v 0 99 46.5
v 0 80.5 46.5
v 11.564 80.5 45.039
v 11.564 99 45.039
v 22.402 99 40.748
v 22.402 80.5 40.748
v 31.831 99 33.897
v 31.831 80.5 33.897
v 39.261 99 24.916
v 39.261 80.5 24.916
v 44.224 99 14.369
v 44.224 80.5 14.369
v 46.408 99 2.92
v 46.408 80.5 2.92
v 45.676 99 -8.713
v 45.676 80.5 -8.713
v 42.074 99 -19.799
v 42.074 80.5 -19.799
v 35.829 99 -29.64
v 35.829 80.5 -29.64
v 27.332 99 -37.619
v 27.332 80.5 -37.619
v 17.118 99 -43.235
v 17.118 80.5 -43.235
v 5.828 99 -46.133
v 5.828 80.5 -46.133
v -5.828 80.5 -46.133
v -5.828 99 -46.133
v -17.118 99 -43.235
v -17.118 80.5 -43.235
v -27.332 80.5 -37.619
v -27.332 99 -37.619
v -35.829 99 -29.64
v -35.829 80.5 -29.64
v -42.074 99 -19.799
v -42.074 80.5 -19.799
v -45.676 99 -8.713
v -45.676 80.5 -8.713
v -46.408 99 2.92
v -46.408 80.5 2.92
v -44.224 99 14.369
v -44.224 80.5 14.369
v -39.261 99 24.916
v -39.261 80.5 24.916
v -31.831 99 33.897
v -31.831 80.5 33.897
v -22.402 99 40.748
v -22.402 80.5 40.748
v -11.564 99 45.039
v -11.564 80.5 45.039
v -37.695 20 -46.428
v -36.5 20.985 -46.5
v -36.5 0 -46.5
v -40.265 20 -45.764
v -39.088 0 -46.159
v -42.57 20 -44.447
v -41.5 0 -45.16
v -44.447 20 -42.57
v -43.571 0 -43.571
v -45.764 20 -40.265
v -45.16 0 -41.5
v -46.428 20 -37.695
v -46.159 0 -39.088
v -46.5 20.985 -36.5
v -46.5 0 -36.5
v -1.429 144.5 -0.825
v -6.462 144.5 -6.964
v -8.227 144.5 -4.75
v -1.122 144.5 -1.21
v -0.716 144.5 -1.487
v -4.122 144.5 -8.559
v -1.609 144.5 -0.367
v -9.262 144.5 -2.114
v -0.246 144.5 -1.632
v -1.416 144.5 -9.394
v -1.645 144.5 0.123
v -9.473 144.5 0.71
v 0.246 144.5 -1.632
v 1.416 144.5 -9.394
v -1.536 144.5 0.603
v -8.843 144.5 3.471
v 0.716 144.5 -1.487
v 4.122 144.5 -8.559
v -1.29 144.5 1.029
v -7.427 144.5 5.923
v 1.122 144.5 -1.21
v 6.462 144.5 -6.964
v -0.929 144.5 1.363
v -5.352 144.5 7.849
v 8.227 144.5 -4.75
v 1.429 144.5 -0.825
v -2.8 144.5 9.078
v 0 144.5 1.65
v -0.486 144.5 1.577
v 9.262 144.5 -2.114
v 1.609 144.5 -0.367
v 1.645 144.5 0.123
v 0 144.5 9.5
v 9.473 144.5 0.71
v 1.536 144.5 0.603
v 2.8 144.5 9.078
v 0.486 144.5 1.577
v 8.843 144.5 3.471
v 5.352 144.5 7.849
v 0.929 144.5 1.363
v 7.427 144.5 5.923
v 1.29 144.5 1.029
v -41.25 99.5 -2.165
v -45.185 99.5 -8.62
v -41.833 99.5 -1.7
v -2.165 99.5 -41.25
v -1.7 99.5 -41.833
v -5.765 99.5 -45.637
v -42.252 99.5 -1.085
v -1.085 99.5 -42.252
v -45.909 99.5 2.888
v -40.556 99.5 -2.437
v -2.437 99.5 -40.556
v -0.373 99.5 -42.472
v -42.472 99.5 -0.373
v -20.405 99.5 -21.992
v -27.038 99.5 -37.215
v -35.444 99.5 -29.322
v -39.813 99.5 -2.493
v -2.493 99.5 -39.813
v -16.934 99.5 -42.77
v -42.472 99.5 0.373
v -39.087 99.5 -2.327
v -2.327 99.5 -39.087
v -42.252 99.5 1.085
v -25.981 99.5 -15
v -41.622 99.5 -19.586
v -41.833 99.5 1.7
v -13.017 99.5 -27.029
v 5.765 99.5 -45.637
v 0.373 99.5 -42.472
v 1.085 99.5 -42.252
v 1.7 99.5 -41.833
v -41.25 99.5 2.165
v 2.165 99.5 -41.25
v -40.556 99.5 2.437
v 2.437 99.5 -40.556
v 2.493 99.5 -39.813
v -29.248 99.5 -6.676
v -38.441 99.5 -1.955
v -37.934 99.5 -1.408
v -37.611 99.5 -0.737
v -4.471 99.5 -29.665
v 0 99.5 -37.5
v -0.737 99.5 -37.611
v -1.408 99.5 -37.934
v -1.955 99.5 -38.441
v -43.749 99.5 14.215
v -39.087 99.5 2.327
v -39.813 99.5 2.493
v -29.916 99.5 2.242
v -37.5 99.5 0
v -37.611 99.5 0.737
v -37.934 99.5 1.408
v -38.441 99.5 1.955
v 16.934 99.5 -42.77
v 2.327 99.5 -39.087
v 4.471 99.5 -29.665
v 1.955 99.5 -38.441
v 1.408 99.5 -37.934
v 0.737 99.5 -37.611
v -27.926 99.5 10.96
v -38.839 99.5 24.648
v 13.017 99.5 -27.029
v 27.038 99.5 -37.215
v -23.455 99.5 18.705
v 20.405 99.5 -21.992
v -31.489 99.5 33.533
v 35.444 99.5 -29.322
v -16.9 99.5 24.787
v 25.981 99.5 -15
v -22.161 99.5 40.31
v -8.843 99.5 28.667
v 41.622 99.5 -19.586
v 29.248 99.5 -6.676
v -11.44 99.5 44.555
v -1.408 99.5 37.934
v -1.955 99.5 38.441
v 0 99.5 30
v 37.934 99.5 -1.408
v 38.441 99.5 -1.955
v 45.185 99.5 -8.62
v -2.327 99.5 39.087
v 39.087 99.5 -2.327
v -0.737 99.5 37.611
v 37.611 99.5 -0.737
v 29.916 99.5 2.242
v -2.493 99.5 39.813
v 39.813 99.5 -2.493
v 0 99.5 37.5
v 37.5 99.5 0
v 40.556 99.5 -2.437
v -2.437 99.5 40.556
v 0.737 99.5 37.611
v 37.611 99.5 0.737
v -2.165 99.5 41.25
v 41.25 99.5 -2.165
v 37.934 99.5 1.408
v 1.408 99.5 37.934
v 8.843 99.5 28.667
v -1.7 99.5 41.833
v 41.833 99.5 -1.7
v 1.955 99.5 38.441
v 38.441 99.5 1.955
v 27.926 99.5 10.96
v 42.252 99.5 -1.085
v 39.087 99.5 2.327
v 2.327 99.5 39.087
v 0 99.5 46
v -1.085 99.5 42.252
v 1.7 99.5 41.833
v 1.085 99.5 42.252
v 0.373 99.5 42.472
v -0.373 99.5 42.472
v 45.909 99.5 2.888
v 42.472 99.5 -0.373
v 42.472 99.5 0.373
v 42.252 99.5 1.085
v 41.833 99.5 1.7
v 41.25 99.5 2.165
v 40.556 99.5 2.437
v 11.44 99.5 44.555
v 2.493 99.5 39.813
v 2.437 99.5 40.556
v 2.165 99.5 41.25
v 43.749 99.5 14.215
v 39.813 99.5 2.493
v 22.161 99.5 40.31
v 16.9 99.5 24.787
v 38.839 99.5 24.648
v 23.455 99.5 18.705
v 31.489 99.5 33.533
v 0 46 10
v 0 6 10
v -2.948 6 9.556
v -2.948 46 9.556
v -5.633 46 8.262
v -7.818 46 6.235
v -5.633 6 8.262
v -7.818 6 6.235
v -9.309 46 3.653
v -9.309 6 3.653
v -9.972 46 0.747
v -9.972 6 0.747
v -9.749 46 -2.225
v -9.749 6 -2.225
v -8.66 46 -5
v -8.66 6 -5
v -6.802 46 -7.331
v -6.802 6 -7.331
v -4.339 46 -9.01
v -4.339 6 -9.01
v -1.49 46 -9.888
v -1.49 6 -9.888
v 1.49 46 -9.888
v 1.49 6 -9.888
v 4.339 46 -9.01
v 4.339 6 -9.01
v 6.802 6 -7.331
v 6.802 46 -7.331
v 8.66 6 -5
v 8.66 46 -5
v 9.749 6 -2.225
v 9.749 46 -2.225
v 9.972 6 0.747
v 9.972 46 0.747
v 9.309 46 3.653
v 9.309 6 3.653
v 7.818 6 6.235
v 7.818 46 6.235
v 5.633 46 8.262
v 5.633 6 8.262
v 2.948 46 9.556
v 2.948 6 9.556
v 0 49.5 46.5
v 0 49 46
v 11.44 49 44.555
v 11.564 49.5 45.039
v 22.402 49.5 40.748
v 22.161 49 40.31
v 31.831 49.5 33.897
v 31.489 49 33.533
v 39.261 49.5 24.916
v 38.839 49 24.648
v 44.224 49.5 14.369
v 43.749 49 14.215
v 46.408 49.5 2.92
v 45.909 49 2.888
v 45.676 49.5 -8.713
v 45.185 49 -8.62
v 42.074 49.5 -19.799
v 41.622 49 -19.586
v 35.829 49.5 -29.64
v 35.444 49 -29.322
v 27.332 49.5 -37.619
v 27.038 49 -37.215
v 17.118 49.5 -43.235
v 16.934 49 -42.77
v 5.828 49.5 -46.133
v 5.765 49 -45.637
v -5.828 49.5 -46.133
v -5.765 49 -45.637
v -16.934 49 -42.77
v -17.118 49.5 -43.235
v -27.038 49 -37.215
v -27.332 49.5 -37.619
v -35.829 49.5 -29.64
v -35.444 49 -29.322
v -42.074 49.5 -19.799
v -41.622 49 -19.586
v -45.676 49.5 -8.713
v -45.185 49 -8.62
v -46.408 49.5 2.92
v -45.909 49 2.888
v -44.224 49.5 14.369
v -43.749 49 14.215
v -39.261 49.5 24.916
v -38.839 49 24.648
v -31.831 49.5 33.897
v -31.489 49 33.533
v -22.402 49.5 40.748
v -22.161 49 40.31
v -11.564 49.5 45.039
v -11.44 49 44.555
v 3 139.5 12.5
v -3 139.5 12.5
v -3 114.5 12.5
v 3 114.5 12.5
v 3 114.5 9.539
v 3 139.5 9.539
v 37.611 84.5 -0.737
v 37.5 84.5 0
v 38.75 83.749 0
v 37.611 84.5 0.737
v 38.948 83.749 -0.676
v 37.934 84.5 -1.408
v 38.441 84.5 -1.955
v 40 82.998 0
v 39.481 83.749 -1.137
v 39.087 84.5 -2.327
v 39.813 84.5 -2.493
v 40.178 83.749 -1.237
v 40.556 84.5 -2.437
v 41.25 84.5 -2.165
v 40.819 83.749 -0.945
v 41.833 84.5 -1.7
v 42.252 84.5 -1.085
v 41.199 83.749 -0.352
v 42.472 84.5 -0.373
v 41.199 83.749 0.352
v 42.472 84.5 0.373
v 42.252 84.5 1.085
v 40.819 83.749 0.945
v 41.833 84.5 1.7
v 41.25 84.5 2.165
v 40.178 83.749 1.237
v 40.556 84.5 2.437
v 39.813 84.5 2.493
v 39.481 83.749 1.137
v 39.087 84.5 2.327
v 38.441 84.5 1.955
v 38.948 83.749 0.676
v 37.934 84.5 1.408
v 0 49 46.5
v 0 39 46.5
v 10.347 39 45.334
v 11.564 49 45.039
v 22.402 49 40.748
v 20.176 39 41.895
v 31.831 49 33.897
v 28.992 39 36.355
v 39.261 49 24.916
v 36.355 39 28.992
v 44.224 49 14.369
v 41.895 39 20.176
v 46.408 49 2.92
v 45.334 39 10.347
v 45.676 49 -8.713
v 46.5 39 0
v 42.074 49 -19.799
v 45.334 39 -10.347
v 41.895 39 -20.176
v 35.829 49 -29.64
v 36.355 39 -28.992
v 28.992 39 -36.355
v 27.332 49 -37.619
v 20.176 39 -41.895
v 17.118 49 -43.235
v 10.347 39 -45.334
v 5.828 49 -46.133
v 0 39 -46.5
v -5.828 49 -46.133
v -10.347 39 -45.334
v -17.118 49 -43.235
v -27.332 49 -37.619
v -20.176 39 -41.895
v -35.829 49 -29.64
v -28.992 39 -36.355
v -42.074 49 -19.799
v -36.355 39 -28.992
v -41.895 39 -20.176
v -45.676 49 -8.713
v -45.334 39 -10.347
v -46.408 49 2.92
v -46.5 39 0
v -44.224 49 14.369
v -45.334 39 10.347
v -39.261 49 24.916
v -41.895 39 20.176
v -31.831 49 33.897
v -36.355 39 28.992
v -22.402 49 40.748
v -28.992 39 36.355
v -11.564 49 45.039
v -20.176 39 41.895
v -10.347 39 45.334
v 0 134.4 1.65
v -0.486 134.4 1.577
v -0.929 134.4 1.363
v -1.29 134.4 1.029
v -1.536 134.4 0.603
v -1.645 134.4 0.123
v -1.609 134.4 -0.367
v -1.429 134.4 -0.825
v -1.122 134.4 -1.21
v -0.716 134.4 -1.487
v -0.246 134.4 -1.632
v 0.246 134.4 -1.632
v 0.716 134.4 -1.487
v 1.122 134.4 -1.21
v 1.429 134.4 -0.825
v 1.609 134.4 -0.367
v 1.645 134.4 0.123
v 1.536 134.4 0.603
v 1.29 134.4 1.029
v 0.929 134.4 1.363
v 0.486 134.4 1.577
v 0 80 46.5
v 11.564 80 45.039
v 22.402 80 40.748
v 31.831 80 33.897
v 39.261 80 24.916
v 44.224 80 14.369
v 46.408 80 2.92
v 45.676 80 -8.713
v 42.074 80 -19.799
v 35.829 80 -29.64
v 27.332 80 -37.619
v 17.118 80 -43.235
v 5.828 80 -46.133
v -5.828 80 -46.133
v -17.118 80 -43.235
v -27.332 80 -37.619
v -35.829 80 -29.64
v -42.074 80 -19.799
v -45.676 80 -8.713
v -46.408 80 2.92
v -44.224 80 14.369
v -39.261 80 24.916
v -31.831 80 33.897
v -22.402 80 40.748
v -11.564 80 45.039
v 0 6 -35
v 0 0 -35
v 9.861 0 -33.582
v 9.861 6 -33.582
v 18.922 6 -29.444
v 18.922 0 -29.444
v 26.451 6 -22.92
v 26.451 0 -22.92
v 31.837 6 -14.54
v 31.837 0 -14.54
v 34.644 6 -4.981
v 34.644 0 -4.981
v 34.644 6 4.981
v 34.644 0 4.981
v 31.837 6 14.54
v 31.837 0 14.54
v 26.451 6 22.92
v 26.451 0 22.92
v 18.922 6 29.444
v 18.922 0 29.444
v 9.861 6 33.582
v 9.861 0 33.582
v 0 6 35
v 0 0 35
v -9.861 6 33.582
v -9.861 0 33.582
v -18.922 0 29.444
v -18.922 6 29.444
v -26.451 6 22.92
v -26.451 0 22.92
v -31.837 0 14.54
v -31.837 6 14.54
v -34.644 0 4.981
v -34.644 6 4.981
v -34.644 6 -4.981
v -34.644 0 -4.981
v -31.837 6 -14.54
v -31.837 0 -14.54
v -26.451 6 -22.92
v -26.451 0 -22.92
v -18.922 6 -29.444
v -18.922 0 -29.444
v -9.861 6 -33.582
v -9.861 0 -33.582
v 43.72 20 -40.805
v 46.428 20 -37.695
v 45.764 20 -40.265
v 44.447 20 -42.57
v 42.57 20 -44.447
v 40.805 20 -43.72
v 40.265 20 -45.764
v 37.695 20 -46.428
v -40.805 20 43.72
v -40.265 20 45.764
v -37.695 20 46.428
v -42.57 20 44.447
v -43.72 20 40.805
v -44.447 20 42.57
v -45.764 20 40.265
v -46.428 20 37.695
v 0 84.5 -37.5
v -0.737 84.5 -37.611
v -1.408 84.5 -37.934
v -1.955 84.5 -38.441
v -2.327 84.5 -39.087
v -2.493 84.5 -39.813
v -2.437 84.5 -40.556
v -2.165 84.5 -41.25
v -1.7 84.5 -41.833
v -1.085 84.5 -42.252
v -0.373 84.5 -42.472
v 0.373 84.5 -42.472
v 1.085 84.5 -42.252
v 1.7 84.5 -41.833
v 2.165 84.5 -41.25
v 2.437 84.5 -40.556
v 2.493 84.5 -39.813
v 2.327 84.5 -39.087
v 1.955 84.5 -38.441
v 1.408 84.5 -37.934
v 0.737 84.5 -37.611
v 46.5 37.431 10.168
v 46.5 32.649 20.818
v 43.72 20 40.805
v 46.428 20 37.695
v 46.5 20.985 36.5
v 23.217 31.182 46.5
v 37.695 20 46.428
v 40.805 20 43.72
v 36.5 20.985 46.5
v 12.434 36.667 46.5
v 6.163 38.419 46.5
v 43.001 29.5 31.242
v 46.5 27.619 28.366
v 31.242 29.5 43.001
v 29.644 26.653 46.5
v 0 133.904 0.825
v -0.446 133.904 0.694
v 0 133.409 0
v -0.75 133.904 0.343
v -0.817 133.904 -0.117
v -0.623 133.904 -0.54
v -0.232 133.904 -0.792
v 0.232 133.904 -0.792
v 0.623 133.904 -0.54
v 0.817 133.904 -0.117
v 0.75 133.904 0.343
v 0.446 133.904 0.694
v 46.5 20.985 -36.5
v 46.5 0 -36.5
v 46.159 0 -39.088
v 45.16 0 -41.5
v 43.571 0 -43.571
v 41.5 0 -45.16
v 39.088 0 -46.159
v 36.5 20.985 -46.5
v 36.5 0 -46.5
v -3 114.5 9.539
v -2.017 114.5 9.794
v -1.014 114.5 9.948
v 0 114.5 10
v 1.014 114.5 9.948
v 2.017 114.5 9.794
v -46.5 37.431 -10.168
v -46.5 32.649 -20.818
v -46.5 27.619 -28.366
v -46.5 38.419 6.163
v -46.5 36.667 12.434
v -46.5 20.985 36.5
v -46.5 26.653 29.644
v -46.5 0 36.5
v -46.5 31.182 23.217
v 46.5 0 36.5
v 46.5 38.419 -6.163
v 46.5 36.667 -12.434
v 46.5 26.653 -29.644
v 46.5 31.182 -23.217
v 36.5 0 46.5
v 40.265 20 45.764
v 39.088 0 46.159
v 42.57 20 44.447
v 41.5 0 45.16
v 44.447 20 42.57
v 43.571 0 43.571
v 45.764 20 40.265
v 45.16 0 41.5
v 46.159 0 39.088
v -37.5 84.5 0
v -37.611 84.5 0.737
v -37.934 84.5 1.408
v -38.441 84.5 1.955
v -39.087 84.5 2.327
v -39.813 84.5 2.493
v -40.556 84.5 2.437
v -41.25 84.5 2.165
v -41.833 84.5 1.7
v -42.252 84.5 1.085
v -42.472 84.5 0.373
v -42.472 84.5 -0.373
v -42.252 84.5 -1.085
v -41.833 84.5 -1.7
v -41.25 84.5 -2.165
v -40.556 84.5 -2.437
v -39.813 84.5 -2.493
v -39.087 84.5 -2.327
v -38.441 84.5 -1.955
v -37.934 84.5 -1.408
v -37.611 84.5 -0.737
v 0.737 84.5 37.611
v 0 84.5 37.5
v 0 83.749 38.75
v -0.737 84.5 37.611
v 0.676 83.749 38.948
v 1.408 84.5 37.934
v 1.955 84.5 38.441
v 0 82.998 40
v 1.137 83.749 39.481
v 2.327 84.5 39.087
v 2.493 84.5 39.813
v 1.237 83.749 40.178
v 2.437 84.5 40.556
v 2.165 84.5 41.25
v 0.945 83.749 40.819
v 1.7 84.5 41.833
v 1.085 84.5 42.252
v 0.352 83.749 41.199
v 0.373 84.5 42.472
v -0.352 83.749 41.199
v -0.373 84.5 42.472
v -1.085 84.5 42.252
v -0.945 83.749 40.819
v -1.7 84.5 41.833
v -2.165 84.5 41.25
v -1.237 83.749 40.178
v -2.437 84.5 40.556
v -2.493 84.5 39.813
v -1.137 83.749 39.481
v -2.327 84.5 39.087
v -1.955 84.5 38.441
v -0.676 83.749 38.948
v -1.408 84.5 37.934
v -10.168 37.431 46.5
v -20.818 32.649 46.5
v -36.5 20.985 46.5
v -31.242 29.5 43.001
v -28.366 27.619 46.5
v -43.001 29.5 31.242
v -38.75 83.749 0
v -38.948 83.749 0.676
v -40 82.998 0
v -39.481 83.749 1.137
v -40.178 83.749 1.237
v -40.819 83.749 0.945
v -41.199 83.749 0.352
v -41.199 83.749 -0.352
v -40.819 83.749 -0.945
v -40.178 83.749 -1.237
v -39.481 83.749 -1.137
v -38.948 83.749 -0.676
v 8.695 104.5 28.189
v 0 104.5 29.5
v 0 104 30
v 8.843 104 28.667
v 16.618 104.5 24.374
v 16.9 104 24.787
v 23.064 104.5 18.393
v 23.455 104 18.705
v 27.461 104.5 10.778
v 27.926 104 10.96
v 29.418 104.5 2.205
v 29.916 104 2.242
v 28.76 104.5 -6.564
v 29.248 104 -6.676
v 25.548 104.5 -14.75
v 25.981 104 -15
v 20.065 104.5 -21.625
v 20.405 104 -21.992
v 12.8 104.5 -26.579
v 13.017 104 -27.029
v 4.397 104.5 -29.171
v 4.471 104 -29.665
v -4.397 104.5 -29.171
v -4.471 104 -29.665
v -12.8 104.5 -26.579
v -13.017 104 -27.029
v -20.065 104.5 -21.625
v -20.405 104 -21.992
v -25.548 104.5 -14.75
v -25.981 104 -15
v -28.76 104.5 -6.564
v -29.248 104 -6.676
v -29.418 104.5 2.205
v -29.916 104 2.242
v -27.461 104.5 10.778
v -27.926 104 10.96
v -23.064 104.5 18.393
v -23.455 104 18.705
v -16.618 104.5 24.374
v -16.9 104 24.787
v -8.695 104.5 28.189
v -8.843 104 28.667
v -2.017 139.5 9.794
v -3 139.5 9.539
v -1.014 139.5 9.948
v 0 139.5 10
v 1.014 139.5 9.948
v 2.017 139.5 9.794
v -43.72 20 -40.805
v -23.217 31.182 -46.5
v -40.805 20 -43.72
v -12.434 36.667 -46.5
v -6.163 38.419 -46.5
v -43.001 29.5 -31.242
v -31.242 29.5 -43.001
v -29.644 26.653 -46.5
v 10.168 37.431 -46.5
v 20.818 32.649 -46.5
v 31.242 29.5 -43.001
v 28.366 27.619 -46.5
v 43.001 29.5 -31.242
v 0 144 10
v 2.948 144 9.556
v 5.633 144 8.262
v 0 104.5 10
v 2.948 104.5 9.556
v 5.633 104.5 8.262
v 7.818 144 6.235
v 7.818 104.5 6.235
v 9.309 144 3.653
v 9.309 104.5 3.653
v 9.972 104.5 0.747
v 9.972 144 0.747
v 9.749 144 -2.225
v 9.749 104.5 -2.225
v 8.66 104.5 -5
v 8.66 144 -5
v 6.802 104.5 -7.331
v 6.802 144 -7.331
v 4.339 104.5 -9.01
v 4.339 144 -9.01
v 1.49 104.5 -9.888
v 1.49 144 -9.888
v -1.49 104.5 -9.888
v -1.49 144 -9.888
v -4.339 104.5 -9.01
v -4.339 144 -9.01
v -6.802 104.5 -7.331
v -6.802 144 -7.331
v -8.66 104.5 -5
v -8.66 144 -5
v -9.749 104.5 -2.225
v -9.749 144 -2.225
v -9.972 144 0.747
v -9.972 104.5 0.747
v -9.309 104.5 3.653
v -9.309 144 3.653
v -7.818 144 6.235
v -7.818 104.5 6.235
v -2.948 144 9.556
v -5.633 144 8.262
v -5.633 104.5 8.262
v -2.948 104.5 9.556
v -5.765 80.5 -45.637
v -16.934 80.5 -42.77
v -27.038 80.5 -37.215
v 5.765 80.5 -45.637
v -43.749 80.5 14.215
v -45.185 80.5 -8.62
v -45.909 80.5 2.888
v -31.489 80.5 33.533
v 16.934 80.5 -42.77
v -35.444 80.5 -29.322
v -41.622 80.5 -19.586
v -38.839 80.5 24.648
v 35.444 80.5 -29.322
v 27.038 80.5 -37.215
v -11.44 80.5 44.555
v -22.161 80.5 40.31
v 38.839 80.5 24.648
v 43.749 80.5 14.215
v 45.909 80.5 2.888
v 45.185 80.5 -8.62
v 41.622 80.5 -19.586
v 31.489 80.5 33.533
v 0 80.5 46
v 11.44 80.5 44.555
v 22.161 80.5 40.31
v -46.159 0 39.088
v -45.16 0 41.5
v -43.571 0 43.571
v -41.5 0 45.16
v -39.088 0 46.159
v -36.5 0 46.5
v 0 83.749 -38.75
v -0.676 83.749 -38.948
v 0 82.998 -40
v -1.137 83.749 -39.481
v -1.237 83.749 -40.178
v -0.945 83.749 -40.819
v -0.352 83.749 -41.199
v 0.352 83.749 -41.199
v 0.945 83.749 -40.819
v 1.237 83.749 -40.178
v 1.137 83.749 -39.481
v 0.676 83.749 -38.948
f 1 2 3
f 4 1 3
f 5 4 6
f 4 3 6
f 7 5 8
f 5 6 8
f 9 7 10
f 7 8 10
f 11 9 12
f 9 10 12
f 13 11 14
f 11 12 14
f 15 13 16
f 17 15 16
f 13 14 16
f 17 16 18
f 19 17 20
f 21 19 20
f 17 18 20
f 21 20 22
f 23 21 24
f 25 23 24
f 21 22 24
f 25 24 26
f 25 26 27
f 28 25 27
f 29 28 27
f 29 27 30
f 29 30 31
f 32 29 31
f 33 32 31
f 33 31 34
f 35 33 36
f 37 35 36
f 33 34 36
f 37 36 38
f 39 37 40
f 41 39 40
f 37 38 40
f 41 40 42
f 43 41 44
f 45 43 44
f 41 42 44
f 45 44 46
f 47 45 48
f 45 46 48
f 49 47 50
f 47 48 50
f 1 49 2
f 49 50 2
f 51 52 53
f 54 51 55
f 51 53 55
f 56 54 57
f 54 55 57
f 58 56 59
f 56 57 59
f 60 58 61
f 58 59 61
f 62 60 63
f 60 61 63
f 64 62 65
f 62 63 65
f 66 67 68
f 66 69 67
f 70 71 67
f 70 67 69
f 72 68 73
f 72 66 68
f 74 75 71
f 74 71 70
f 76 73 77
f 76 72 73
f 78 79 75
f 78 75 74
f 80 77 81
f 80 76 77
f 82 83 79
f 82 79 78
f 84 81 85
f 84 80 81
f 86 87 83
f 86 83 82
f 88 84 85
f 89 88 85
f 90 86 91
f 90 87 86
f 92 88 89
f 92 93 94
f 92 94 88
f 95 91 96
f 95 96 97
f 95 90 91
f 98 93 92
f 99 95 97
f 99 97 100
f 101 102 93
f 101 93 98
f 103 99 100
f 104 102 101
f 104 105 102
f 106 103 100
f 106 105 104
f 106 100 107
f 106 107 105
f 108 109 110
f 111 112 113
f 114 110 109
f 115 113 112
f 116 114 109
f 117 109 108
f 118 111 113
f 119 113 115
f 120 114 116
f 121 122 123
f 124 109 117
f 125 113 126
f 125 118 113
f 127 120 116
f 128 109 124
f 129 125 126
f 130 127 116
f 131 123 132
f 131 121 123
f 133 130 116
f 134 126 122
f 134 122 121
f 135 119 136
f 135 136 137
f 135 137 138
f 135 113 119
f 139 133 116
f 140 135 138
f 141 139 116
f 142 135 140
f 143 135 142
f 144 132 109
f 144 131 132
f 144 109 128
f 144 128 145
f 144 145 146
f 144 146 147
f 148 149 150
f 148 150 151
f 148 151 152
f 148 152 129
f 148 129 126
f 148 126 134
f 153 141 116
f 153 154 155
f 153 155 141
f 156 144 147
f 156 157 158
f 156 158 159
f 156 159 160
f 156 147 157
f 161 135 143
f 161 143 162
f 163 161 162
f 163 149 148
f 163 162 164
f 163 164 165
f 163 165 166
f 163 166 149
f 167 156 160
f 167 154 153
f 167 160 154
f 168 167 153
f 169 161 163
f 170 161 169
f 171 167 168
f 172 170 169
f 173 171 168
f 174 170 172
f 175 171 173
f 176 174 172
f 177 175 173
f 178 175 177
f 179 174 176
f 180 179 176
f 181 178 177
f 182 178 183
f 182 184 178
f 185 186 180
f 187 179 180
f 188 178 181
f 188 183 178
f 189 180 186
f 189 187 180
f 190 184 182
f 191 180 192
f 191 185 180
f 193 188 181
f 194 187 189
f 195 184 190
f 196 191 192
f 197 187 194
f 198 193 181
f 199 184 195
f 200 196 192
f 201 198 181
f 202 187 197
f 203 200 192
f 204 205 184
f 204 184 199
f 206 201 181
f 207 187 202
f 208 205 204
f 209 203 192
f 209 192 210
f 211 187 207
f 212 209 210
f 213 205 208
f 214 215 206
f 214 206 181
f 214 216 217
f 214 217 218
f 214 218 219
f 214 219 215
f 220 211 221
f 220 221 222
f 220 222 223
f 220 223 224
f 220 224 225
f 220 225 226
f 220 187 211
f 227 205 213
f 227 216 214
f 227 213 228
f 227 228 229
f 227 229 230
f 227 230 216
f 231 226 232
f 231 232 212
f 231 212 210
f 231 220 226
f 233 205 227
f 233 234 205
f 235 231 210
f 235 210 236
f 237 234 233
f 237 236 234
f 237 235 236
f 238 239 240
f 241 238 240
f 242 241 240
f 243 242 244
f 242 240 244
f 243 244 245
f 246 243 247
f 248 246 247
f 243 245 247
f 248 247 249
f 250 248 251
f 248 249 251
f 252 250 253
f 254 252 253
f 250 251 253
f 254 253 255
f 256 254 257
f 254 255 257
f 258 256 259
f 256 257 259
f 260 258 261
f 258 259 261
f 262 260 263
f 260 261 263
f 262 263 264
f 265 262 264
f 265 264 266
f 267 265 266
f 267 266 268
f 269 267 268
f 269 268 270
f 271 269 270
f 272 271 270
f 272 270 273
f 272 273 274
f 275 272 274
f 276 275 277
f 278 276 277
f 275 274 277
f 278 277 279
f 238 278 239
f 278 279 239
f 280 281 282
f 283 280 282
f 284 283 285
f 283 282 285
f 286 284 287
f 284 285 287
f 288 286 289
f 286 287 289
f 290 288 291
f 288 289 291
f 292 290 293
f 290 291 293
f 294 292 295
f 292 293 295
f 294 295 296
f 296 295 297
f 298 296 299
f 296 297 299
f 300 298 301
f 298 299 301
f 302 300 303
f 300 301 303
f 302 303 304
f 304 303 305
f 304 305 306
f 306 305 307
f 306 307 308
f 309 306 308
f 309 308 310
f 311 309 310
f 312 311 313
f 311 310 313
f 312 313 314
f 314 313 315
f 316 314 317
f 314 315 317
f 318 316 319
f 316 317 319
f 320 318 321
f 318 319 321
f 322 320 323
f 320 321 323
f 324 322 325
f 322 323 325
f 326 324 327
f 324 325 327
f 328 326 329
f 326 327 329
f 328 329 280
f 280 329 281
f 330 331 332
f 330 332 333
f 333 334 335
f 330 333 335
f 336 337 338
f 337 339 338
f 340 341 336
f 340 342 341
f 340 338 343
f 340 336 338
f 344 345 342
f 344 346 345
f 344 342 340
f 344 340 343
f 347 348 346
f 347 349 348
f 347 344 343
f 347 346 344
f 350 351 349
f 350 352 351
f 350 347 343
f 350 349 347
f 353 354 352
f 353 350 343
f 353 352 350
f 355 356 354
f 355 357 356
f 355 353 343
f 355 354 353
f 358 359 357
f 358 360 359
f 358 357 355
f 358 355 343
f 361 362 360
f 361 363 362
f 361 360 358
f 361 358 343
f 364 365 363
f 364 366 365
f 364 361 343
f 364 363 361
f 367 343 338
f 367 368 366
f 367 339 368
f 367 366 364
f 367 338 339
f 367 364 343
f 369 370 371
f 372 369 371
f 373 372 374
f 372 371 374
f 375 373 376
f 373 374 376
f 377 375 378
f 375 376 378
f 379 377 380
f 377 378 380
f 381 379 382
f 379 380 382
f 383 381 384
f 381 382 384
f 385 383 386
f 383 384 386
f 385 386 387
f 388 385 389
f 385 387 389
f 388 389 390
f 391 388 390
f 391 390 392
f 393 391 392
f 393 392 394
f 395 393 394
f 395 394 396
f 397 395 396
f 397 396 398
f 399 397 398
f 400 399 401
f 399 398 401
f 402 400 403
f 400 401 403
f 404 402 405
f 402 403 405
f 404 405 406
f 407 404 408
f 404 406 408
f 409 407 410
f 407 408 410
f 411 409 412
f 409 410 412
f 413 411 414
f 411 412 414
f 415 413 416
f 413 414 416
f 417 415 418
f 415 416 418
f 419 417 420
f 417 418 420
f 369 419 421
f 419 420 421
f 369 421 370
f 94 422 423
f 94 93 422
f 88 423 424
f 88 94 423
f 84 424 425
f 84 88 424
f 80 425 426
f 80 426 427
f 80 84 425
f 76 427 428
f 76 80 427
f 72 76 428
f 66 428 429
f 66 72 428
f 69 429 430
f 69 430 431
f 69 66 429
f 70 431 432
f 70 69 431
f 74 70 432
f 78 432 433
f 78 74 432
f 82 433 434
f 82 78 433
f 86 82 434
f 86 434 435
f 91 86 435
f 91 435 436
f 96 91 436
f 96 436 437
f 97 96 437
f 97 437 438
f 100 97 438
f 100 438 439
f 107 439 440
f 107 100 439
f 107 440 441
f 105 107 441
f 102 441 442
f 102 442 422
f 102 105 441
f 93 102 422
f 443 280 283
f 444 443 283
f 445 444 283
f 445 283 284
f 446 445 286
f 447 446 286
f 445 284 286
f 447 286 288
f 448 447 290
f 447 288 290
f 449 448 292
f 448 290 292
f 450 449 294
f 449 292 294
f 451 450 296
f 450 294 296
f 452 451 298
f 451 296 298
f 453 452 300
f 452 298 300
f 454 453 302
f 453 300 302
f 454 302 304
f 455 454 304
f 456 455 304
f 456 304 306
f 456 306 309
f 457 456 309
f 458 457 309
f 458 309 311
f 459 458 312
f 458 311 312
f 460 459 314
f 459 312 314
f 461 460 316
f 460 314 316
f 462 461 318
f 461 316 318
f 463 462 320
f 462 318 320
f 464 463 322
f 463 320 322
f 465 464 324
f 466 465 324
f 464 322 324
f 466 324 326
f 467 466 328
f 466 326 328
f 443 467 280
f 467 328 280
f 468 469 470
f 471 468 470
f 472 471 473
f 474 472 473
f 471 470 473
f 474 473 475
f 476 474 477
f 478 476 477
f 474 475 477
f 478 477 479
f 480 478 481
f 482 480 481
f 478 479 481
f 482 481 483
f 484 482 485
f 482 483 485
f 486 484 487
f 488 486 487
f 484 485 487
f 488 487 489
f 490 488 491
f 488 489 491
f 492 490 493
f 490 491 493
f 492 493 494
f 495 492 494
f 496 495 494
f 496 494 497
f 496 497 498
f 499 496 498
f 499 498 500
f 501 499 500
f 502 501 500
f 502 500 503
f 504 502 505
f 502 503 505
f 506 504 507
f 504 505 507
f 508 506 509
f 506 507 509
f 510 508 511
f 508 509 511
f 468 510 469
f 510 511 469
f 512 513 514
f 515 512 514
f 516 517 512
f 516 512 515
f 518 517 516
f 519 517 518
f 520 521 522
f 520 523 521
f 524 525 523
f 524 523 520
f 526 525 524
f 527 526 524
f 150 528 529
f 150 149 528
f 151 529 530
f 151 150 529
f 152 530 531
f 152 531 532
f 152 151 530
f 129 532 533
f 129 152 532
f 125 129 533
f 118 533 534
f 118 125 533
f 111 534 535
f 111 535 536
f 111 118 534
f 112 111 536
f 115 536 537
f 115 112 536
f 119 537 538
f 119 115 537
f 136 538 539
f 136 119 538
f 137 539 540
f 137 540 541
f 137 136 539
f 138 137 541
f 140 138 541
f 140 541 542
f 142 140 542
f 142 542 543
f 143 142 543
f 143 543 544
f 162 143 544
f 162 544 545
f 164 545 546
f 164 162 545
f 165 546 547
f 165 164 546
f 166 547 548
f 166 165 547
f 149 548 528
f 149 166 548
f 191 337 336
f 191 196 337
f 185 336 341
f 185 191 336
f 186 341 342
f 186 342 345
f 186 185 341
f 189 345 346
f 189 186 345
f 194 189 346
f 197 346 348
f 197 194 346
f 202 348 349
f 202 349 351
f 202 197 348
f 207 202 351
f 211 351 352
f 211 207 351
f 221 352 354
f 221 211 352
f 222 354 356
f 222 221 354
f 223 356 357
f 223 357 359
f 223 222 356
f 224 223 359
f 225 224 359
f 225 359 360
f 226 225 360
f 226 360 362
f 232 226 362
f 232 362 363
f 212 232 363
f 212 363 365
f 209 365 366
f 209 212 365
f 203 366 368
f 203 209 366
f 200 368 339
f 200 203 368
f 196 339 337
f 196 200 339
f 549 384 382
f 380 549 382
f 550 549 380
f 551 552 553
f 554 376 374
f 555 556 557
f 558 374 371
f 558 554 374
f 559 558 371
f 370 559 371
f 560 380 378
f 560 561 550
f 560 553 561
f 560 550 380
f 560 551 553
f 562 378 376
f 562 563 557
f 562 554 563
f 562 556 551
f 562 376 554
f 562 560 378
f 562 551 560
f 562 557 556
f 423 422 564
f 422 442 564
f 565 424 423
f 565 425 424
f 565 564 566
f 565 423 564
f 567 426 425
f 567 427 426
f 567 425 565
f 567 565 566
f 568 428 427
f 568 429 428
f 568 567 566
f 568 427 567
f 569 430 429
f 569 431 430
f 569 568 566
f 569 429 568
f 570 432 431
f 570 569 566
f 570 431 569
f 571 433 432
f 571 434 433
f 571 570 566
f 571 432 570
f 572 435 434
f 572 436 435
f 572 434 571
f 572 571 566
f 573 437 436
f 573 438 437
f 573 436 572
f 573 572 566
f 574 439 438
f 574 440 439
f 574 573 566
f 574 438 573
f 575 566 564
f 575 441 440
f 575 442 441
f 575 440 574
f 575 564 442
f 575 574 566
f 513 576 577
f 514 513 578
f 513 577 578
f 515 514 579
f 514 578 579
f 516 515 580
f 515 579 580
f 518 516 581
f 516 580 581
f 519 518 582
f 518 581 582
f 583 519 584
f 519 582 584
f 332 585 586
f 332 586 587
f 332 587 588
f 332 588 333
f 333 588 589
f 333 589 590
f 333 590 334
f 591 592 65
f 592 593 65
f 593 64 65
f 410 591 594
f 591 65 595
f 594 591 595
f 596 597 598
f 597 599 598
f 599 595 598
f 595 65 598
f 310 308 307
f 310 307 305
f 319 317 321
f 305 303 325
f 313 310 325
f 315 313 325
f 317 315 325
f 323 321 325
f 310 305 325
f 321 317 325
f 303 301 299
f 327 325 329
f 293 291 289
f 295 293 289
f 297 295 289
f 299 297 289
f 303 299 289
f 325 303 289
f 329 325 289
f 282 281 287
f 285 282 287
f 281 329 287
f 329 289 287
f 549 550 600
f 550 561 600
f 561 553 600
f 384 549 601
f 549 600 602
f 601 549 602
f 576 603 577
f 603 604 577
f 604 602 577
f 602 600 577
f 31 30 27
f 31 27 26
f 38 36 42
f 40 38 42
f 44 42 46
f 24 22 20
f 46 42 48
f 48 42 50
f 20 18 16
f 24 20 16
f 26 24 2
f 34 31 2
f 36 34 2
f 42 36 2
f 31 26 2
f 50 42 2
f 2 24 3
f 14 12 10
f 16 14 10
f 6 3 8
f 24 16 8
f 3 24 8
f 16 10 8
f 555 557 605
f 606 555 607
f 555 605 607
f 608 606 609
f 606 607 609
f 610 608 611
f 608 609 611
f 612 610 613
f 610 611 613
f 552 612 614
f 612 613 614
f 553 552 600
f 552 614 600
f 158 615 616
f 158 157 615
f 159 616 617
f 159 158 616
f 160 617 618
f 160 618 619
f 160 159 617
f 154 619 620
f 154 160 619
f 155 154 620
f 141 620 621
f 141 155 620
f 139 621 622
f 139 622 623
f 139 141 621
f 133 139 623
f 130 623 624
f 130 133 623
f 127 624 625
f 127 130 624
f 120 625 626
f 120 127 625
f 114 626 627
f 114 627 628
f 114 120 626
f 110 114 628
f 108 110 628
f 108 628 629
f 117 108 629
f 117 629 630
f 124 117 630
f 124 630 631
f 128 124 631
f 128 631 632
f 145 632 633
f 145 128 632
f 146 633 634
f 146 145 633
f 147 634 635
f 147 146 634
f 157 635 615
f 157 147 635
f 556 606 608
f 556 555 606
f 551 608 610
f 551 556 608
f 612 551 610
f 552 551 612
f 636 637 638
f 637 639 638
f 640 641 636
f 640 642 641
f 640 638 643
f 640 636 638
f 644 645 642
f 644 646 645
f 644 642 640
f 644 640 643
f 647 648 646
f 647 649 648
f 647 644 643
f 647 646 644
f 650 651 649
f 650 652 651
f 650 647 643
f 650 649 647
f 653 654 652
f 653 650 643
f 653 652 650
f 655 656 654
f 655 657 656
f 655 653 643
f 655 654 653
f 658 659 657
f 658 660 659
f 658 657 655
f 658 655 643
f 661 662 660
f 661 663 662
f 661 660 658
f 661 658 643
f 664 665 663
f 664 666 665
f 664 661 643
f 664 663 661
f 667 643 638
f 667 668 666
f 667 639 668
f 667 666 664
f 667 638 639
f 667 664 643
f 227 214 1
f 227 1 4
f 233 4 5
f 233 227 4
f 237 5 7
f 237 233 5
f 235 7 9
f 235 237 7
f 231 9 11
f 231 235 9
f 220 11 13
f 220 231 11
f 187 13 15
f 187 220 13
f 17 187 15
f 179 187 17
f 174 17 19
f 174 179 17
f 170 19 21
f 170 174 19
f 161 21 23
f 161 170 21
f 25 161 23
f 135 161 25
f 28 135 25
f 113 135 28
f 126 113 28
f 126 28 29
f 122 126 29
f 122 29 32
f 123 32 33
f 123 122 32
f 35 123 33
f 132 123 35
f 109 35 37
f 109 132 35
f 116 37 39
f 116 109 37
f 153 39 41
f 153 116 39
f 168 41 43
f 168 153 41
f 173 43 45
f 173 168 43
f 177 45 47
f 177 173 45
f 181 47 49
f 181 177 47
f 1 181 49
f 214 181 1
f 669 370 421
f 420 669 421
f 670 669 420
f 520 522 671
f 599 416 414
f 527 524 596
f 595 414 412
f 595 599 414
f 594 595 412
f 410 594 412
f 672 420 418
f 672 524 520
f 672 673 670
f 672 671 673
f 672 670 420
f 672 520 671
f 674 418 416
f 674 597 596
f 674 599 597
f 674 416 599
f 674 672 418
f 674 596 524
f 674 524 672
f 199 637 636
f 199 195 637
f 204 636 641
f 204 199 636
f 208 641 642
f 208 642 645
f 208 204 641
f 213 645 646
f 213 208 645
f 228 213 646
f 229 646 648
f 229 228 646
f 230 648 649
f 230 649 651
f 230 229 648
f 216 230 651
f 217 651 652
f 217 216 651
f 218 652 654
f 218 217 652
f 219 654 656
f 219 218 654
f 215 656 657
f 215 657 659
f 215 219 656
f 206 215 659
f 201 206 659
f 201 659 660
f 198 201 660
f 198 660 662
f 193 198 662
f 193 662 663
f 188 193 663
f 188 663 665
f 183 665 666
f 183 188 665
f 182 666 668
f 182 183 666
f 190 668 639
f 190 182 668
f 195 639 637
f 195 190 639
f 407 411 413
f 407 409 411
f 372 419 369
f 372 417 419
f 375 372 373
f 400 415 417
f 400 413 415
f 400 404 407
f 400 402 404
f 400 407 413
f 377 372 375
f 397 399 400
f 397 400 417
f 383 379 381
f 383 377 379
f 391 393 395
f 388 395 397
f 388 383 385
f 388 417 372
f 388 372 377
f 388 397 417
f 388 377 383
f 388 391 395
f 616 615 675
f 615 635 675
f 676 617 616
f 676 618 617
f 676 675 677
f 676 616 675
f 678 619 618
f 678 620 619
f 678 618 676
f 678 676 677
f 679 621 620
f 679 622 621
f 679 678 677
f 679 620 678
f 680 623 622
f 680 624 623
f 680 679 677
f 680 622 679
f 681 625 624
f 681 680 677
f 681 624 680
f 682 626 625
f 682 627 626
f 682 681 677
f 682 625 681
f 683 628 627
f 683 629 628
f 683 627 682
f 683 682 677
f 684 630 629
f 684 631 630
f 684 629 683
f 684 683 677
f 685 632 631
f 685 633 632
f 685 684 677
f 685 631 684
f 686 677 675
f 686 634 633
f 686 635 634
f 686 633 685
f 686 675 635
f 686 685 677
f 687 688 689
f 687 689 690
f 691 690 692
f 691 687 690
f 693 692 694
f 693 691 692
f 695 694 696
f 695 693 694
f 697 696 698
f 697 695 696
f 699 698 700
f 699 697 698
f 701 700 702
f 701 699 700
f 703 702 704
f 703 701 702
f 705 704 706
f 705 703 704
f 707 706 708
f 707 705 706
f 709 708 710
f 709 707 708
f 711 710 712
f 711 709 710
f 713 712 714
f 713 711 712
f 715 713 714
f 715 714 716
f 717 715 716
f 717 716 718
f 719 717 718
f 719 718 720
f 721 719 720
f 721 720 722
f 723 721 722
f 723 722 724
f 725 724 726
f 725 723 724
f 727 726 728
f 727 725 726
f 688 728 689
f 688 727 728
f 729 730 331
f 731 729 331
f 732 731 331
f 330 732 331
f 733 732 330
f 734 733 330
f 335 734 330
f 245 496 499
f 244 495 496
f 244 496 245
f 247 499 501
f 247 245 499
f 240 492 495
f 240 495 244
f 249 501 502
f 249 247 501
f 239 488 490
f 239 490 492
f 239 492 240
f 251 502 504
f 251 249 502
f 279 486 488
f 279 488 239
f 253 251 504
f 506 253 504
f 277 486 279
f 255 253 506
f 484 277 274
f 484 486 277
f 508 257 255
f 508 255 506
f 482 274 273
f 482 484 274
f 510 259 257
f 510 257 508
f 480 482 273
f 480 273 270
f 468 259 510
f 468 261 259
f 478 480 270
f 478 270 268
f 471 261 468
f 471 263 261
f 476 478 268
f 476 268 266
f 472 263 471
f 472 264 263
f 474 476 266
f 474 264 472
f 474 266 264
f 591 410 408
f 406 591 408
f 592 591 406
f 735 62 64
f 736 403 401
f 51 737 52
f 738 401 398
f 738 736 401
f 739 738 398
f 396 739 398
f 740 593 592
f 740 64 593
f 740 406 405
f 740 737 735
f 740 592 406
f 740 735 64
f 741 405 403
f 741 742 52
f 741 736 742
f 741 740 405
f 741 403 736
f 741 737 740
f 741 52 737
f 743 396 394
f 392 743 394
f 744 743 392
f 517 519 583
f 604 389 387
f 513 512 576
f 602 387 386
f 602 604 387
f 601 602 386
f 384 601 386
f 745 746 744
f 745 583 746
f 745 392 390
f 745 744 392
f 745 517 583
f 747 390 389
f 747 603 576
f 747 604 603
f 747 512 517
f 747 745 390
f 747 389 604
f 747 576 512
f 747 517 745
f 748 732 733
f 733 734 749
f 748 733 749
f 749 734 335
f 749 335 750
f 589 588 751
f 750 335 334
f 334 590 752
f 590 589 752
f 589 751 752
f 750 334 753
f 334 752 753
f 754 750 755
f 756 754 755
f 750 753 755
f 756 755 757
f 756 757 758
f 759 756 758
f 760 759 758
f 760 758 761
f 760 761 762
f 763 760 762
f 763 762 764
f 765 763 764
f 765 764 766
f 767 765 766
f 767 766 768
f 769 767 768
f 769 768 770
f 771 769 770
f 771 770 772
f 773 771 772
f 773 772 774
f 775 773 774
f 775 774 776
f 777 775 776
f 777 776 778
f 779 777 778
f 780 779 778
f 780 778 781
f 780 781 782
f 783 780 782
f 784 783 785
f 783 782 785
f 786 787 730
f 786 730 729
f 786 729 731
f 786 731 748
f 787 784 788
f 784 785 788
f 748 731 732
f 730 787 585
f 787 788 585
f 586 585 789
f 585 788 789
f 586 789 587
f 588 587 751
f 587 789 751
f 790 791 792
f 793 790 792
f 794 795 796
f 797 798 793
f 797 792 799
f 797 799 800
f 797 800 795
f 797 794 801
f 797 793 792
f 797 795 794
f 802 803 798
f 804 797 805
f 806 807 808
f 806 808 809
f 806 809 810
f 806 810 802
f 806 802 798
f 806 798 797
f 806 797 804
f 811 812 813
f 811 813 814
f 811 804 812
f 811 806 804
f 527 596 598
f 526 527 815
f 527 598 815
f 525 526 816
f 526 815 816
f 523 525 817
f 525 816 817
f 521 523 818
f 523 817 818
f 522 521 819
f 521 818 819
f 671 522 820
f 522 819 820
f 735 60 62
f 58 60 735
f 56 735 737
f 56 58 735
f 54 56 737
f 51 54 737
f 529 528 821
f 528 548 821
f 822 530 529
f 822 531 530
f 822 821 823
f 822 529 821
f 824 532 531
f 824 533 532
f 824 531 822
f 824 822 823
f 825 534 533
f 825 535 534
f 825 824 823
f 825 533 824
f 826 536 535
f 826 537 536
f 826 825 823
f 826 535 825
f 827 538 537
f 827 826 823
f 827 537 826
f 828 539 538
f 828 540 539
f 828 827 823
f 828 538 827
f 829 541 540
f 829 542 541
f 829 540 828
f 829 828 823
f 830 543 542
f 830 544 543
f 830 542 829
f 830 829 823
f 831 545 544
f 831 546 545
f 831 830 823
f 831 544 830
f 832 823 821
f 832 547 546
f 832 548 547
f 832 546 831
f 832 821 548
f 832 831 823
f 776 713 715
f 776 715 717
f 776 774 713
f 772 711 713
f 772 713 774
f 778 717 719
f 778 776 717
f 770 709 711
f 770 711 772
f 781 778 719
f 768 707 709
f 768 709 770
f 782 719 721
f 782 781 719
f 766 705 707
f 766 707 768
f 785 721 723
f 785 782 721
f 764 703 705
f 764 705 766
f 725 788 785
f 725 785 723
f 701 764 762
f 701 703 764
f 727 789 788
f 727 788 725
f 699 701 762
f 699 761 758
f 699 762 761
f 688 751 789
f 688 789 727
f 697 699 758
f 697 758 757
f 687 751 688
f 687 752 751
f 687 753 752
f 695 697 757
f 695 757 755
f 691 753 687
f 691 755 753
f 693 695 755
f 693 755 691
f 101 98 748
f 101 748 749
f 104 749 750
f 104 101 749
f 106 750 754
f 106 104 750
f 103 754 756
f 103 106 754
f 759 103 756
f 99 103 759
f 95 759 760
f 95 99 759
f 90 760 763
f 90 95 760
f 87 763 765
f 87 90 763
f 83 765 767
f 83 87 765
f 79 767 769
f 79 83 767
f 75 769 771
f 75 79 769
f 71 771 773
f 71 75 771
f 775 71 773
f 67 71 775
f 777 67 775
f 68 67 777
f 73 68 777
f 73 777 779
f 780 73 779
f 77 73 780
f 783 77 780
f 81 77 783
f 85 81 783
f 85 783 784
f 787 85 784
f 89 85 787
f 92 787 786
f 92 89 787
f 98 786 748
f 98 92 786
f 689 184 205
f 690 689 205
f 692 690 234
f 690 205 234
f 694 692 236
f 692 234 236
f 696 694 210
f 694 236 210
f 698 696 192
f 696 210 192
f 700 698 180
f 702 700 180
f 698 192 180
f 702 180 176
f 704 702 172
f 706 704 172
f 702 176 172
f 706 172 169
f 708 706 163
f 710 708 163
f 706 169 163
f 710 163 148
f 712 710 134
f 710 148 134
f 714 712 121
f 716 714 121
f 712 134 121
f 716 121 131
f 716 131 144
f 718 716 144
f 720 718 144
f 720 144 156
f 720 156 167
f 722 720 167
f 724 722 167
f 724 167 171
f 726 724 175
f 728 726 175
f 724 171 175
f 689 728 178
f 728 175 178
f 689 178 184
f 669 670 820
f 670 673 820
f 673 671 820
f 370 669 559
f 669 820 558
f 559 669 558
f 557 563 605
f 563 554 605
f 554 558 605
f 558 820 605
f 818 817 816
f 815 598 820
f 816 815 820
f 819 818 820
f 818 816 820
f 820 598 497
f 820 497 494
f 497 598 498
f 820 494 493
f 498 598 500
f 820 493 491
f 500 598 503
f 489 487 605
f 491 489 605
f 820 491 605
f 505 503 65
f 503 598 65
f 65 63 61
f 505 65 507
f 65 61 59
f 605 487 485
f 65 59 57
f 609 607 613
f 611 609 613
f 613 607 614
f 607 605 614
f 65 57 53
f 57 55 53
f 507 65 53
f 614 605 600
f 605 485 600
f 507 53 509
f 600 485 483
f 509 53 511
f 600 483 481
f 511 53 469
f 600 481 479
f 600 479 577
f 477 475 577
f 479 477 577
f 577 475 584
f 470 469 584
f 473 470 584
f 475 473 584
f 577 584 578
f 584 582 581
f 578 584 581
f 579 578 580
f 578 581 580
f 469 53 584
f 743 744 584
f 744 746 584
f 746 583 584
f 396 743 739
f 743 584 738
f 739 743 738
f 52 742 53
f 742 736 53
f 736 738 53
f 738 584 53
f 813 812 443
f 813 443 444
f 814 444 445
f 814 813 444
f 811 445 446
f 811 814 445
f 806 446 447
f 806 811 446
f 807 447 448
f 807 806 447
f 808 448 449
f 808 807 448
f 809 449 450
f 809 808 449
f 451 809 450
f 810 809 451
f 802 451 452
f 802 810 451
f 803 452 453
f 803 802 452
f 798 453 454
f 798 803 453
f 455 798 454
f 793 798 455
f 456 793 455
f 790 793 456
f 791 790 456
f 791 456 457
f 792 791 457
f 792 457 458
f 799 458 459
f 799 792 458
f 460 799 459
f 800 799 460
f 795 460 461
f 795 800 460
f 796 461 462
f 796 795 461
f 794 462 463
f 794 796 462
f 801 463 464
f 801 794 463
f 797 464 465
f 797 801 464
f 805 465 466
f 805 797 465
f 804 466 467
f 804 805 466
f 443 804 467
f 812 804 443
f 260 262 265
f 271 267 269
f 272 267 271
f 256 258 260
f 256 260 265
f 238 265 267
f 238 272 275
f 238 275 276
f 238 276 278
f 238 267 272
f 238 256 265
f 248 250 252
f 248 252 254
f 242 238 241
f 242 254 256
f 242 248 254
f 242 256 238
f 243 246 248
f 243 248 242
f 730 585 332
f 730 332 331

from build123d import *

# Parameters (mm, degrees)
EXTRUDE_1_DEPTH               = 49
CUT_EXTRUDE_START             = -10
SKETCH_2_OUTSIDE_W            = 123.07
SKETCH_2_OUTSIDE_H            = 123.07
SKETCH_2_OUTSIDE_R            = 46.5
CUT_EXTRUDE_3_DEPTH           = 10
CUT_EXTRUDE_3_OTHER_WAY_DEPTH = 19
CUT_EXTRUDE_3_OTHER_WAY_TAPER = 35
SKETCH_3_R                    = 46.5
EXTRUDE_2_DEPTH               = 31.5
SKETCH_4_R                    = 46.5
EXTRUDE_3_DEPTH               = 19
CHAMFER_1_SIZE                = 0.5
SKETCH_6_R                    = 30
EXTRUDE_5_DEPTH               = 5
SKETCH_7_R                    = 10
EXTRUDE_6_DEPTH               = 40
CHAMFER_2_SIZE                = 0.5
PATTERN_CIRCULAR_1_COUNT      = 4
SKETCH_10_W                   = 6
SKETCH_10_H                   = 25
EXTRUDE_7_DEPTH               = 12.5
SKETCH_11_R                   = 35
CUT_EXTRUDE_4_DEPTH           = 6
SKETCH_12_R                   = 10
CUT_EXTRUDE_5_DEPTH           = 40


with BuildPart() as part:
    # 草圖1 → 填料-伸長1 (new body)
    with BuildSketch(Plane(origin=(0, 0, 0), x_dir=(1, 0, 0), z_dir=(0, 1, 0))):
        with BuildLine():
            Line((-36.5, -46.5), (36.5, -46.5))
            ThreePointArc((36.5, -46.5), (43.571067812, -43.571067812), (46.5, -36.5))
            Line((46.5, -36.5), (46.5, 36.5))
            ThreePointArc((46.5, 36.5), (43.571067812, 43.571067812), (36.5, 46.5))
            Line((36.5, 46.5), (-36.5, 46.5))
            ThreePointArc((-36.5, 46.5), (-43.571067812, 43.571067812), (-46.5, 36.5))
            Line((-46.5, 36.5), (-46.5, -36.5))
            ThreePointArc((-46.5, -36.5), (-43.571067812, -43.571067812), (-36.5, -46.5))
        make_face()
    extrude(amount=EXTRUDE_1_DEPTH)

    # 草圖2 outside → 除料-伸長3 (cut)
    with BuildSketch(Plane(origin=(0, 49, 0), x_dir=(1, 0, 0), z_dir=(0, 1, 0)).offset(CUT_EXTRUDE_START)):
        Rectangle(SKETCH_2_OUTSIDE_W, SKETCH_2_OUTSIDE_H)
        with Locations(Location((0, 0, 0), (0, 0, 270))):  # turned: the seam where the file's is
            Circle(SKETCH_2_OUTSIDE_R, mode=Mode.SUBTRACT)
    extrude(amount=CUT_EXTRUDE_3_DEPTH, mode=Mode.SUBTRACT)

    # 草圖2 outside → 除料-伸長3 other way (cut)
    with BuildSketch(Plane(origin=(0, 49, 0), x_dir=(1, 0, 0), z_dir=(0, 1, 0)).offset(CUT_EXTRUDE_START)):
        Rectangle(SKETCH_2_OUTSIDE_W, SKETCH_2_OUTSIDE_H)
        with Locations(Location((0, 0, 0), (0, 0, 270))):  # turned: the seam where the file's is
            Circle(SKETCH_2_OUTSIDE_R, mode=Mode.SUBTRACT)
    extrude(amount=-CUT_EXTRUDE_3_OTHER_WAY_DEPTH, taper=CUT_EXTRUDE_3_OTHER_WAY_TAPER, mode=Mode.SUBTRACT)

    # 草圖11 → 除料-伸長4 (cut)
    with BuildSketch(Plane.XZ):
        with Locations(Location((0, 0, 0), (0, 0, 270))):  # turned: the seam where the file's is
            Circle(SKETCH_11_R)
    extrude(amount=-CUT_EXTRUDE_4_DEPTH, mode=Mode.SUBTRACT)

    # 草圖12 → 除料-伸長5 (cut)
    with BuildSketch(Plane.XZ.offset(-6)):
        with Locations(Location((0, 0, 0), (0, 0, 90))):  # turned: the seam where the file's is
            Circle(SKETCH_12_R)
    extrude(amount=-CUT_EXTRUDE_5_DEPTH, mode=Mode.SUBTRACT)


with BuildPart() as body_2:
    # 草圖3 → 填料-伸長2 (new body)
    with BuildSketch(Plane(origin=(0, 49, 0), x_dir=(1, 0, 0), z_dir=(0, 1, 0))):
        with Locations(Location((0, 0, 0), (0, 0, 270))):  # turned: the seam where the file's is
            Circle(SKETCH_3_R)
    extrude(amount=EXTRUDE_2_DEPTH)

    # 導角1
    chamfer_1_edges = [body_2.edges().sort_by_distance(p)[0] for p in [
        (0, 49, -46.5),
        (0, 80.5, -46.5),
    ]]
    chamfer(chamfer_1_edges, length=CHAMFER_1_SIZE)


with BuildPart() as body_3:
    # 草圖4 → 填料-伸長3 (new body)
    with BuildSketch(Plane(origin=(0, 80.5, 0), x_dir=(1, 0, 0), z_dir=(0, 1, 0))):
        with Locations(Location((0, 0, 0), (0, 0, 270))):  # turned: the seam where the file's is
            Circle(SKETCH_4_R)
    extrude(amount=EXTRUDE_3_DEPTH)

    # 草圖6 → 填料-伸長5 (add)
    with BuildSketch(Plane(origin=(0, 99.5, 0), x_dir=(1, 0, 0), z_dir=(0, 1, 0))):
        with Locations(Location((0, 0, 0), (0, 0, 270))):  # turned: the seam where the file's is
            Circle(SKETCH_6_R)
    extrude(amount=EXTRUDE_5_DEPTH)

    # 草圖7 → 填料-伸長6 (add)
    with BuildSketch(Plane(origin=(0, 104.5, 0), x_dir=(1, 0, 0), z_dir=(0, 1, 0))):
        with Locations(Location((0, 0, 0), (0, 0, 270))):  # turned: the seam where the file's is
            Circle(SKETCH_7_R)
    extrude(amount=EXTRUDE_6_DEPTH)

    # 導角2
    chamfer_2_edges = [body_3.edges().sort_by_distance(p)[0] for p in [
        (0, 144.5, -10),
        (0, 99.5, -46.5),
        (0, 104.5, -30),
    ]]
    chamfer(chamfer_2_edges, length=CHAMFER_2_SIZE)

    # 草圖8 → M6x1.0 螺紋孔1 (revolve, cut)
    with BuildSketch(Plane(origin=(0, 99.5, -40), x_dir=(0, 0, 1), z_dir=(1, 0, 0))):
        Polygon((0, 0), (0, 16.502151548), (2.5, 15), (2.5, 0), align=None)
    m6x1_0_1 = revolve(axis=Axis((0, 105.85, -40), (0, -1, 0)), mode=Mode.SUBTRACT)

    # 環狀複製排列1: M6x1.0 螺紋孔1 ×4 about axis
    pattern_circular_1_axis = Axis((0, 0, 0), (0, 1, 0))
    for i in range(1, PATTERN_CIRCULAR_1_COUNT):
        add(m6x1_0_1.rotate(pattern_circular_1_axis, i * 360 / PATTERN_CIRCULAR_1_COUNT), mode=Mode.SUBTRACT)

    # 草圖10 → 填料-伸長7 (add)
    with BuildSketch(Plane.XY):
        with Locations((0, 127)):
            Rectangle(SKETCH_10_W, SKETCH_10_H)
    extrude(amount=EXTRUDE_7_DEPTH)

    # 草圖13 → M4x0.7 螺紋孔1 (revolve, cut)
    with BuildSketch(Plane(origin=(0, 144.5, 0), x_dir=(0, 0, 1), z_dir=(1, 0, 0))):
        Polygon((0, 0), (0, 11.091420021), (1.65, 10.1), (1.65, 0), align=None)
    revolve(axis=Axis((0, 150.85, 0), (0, -1, 0)), mode=Mode.SUBTRACT)


solid = Compound([part.part, body_2.part, body_3.part])
